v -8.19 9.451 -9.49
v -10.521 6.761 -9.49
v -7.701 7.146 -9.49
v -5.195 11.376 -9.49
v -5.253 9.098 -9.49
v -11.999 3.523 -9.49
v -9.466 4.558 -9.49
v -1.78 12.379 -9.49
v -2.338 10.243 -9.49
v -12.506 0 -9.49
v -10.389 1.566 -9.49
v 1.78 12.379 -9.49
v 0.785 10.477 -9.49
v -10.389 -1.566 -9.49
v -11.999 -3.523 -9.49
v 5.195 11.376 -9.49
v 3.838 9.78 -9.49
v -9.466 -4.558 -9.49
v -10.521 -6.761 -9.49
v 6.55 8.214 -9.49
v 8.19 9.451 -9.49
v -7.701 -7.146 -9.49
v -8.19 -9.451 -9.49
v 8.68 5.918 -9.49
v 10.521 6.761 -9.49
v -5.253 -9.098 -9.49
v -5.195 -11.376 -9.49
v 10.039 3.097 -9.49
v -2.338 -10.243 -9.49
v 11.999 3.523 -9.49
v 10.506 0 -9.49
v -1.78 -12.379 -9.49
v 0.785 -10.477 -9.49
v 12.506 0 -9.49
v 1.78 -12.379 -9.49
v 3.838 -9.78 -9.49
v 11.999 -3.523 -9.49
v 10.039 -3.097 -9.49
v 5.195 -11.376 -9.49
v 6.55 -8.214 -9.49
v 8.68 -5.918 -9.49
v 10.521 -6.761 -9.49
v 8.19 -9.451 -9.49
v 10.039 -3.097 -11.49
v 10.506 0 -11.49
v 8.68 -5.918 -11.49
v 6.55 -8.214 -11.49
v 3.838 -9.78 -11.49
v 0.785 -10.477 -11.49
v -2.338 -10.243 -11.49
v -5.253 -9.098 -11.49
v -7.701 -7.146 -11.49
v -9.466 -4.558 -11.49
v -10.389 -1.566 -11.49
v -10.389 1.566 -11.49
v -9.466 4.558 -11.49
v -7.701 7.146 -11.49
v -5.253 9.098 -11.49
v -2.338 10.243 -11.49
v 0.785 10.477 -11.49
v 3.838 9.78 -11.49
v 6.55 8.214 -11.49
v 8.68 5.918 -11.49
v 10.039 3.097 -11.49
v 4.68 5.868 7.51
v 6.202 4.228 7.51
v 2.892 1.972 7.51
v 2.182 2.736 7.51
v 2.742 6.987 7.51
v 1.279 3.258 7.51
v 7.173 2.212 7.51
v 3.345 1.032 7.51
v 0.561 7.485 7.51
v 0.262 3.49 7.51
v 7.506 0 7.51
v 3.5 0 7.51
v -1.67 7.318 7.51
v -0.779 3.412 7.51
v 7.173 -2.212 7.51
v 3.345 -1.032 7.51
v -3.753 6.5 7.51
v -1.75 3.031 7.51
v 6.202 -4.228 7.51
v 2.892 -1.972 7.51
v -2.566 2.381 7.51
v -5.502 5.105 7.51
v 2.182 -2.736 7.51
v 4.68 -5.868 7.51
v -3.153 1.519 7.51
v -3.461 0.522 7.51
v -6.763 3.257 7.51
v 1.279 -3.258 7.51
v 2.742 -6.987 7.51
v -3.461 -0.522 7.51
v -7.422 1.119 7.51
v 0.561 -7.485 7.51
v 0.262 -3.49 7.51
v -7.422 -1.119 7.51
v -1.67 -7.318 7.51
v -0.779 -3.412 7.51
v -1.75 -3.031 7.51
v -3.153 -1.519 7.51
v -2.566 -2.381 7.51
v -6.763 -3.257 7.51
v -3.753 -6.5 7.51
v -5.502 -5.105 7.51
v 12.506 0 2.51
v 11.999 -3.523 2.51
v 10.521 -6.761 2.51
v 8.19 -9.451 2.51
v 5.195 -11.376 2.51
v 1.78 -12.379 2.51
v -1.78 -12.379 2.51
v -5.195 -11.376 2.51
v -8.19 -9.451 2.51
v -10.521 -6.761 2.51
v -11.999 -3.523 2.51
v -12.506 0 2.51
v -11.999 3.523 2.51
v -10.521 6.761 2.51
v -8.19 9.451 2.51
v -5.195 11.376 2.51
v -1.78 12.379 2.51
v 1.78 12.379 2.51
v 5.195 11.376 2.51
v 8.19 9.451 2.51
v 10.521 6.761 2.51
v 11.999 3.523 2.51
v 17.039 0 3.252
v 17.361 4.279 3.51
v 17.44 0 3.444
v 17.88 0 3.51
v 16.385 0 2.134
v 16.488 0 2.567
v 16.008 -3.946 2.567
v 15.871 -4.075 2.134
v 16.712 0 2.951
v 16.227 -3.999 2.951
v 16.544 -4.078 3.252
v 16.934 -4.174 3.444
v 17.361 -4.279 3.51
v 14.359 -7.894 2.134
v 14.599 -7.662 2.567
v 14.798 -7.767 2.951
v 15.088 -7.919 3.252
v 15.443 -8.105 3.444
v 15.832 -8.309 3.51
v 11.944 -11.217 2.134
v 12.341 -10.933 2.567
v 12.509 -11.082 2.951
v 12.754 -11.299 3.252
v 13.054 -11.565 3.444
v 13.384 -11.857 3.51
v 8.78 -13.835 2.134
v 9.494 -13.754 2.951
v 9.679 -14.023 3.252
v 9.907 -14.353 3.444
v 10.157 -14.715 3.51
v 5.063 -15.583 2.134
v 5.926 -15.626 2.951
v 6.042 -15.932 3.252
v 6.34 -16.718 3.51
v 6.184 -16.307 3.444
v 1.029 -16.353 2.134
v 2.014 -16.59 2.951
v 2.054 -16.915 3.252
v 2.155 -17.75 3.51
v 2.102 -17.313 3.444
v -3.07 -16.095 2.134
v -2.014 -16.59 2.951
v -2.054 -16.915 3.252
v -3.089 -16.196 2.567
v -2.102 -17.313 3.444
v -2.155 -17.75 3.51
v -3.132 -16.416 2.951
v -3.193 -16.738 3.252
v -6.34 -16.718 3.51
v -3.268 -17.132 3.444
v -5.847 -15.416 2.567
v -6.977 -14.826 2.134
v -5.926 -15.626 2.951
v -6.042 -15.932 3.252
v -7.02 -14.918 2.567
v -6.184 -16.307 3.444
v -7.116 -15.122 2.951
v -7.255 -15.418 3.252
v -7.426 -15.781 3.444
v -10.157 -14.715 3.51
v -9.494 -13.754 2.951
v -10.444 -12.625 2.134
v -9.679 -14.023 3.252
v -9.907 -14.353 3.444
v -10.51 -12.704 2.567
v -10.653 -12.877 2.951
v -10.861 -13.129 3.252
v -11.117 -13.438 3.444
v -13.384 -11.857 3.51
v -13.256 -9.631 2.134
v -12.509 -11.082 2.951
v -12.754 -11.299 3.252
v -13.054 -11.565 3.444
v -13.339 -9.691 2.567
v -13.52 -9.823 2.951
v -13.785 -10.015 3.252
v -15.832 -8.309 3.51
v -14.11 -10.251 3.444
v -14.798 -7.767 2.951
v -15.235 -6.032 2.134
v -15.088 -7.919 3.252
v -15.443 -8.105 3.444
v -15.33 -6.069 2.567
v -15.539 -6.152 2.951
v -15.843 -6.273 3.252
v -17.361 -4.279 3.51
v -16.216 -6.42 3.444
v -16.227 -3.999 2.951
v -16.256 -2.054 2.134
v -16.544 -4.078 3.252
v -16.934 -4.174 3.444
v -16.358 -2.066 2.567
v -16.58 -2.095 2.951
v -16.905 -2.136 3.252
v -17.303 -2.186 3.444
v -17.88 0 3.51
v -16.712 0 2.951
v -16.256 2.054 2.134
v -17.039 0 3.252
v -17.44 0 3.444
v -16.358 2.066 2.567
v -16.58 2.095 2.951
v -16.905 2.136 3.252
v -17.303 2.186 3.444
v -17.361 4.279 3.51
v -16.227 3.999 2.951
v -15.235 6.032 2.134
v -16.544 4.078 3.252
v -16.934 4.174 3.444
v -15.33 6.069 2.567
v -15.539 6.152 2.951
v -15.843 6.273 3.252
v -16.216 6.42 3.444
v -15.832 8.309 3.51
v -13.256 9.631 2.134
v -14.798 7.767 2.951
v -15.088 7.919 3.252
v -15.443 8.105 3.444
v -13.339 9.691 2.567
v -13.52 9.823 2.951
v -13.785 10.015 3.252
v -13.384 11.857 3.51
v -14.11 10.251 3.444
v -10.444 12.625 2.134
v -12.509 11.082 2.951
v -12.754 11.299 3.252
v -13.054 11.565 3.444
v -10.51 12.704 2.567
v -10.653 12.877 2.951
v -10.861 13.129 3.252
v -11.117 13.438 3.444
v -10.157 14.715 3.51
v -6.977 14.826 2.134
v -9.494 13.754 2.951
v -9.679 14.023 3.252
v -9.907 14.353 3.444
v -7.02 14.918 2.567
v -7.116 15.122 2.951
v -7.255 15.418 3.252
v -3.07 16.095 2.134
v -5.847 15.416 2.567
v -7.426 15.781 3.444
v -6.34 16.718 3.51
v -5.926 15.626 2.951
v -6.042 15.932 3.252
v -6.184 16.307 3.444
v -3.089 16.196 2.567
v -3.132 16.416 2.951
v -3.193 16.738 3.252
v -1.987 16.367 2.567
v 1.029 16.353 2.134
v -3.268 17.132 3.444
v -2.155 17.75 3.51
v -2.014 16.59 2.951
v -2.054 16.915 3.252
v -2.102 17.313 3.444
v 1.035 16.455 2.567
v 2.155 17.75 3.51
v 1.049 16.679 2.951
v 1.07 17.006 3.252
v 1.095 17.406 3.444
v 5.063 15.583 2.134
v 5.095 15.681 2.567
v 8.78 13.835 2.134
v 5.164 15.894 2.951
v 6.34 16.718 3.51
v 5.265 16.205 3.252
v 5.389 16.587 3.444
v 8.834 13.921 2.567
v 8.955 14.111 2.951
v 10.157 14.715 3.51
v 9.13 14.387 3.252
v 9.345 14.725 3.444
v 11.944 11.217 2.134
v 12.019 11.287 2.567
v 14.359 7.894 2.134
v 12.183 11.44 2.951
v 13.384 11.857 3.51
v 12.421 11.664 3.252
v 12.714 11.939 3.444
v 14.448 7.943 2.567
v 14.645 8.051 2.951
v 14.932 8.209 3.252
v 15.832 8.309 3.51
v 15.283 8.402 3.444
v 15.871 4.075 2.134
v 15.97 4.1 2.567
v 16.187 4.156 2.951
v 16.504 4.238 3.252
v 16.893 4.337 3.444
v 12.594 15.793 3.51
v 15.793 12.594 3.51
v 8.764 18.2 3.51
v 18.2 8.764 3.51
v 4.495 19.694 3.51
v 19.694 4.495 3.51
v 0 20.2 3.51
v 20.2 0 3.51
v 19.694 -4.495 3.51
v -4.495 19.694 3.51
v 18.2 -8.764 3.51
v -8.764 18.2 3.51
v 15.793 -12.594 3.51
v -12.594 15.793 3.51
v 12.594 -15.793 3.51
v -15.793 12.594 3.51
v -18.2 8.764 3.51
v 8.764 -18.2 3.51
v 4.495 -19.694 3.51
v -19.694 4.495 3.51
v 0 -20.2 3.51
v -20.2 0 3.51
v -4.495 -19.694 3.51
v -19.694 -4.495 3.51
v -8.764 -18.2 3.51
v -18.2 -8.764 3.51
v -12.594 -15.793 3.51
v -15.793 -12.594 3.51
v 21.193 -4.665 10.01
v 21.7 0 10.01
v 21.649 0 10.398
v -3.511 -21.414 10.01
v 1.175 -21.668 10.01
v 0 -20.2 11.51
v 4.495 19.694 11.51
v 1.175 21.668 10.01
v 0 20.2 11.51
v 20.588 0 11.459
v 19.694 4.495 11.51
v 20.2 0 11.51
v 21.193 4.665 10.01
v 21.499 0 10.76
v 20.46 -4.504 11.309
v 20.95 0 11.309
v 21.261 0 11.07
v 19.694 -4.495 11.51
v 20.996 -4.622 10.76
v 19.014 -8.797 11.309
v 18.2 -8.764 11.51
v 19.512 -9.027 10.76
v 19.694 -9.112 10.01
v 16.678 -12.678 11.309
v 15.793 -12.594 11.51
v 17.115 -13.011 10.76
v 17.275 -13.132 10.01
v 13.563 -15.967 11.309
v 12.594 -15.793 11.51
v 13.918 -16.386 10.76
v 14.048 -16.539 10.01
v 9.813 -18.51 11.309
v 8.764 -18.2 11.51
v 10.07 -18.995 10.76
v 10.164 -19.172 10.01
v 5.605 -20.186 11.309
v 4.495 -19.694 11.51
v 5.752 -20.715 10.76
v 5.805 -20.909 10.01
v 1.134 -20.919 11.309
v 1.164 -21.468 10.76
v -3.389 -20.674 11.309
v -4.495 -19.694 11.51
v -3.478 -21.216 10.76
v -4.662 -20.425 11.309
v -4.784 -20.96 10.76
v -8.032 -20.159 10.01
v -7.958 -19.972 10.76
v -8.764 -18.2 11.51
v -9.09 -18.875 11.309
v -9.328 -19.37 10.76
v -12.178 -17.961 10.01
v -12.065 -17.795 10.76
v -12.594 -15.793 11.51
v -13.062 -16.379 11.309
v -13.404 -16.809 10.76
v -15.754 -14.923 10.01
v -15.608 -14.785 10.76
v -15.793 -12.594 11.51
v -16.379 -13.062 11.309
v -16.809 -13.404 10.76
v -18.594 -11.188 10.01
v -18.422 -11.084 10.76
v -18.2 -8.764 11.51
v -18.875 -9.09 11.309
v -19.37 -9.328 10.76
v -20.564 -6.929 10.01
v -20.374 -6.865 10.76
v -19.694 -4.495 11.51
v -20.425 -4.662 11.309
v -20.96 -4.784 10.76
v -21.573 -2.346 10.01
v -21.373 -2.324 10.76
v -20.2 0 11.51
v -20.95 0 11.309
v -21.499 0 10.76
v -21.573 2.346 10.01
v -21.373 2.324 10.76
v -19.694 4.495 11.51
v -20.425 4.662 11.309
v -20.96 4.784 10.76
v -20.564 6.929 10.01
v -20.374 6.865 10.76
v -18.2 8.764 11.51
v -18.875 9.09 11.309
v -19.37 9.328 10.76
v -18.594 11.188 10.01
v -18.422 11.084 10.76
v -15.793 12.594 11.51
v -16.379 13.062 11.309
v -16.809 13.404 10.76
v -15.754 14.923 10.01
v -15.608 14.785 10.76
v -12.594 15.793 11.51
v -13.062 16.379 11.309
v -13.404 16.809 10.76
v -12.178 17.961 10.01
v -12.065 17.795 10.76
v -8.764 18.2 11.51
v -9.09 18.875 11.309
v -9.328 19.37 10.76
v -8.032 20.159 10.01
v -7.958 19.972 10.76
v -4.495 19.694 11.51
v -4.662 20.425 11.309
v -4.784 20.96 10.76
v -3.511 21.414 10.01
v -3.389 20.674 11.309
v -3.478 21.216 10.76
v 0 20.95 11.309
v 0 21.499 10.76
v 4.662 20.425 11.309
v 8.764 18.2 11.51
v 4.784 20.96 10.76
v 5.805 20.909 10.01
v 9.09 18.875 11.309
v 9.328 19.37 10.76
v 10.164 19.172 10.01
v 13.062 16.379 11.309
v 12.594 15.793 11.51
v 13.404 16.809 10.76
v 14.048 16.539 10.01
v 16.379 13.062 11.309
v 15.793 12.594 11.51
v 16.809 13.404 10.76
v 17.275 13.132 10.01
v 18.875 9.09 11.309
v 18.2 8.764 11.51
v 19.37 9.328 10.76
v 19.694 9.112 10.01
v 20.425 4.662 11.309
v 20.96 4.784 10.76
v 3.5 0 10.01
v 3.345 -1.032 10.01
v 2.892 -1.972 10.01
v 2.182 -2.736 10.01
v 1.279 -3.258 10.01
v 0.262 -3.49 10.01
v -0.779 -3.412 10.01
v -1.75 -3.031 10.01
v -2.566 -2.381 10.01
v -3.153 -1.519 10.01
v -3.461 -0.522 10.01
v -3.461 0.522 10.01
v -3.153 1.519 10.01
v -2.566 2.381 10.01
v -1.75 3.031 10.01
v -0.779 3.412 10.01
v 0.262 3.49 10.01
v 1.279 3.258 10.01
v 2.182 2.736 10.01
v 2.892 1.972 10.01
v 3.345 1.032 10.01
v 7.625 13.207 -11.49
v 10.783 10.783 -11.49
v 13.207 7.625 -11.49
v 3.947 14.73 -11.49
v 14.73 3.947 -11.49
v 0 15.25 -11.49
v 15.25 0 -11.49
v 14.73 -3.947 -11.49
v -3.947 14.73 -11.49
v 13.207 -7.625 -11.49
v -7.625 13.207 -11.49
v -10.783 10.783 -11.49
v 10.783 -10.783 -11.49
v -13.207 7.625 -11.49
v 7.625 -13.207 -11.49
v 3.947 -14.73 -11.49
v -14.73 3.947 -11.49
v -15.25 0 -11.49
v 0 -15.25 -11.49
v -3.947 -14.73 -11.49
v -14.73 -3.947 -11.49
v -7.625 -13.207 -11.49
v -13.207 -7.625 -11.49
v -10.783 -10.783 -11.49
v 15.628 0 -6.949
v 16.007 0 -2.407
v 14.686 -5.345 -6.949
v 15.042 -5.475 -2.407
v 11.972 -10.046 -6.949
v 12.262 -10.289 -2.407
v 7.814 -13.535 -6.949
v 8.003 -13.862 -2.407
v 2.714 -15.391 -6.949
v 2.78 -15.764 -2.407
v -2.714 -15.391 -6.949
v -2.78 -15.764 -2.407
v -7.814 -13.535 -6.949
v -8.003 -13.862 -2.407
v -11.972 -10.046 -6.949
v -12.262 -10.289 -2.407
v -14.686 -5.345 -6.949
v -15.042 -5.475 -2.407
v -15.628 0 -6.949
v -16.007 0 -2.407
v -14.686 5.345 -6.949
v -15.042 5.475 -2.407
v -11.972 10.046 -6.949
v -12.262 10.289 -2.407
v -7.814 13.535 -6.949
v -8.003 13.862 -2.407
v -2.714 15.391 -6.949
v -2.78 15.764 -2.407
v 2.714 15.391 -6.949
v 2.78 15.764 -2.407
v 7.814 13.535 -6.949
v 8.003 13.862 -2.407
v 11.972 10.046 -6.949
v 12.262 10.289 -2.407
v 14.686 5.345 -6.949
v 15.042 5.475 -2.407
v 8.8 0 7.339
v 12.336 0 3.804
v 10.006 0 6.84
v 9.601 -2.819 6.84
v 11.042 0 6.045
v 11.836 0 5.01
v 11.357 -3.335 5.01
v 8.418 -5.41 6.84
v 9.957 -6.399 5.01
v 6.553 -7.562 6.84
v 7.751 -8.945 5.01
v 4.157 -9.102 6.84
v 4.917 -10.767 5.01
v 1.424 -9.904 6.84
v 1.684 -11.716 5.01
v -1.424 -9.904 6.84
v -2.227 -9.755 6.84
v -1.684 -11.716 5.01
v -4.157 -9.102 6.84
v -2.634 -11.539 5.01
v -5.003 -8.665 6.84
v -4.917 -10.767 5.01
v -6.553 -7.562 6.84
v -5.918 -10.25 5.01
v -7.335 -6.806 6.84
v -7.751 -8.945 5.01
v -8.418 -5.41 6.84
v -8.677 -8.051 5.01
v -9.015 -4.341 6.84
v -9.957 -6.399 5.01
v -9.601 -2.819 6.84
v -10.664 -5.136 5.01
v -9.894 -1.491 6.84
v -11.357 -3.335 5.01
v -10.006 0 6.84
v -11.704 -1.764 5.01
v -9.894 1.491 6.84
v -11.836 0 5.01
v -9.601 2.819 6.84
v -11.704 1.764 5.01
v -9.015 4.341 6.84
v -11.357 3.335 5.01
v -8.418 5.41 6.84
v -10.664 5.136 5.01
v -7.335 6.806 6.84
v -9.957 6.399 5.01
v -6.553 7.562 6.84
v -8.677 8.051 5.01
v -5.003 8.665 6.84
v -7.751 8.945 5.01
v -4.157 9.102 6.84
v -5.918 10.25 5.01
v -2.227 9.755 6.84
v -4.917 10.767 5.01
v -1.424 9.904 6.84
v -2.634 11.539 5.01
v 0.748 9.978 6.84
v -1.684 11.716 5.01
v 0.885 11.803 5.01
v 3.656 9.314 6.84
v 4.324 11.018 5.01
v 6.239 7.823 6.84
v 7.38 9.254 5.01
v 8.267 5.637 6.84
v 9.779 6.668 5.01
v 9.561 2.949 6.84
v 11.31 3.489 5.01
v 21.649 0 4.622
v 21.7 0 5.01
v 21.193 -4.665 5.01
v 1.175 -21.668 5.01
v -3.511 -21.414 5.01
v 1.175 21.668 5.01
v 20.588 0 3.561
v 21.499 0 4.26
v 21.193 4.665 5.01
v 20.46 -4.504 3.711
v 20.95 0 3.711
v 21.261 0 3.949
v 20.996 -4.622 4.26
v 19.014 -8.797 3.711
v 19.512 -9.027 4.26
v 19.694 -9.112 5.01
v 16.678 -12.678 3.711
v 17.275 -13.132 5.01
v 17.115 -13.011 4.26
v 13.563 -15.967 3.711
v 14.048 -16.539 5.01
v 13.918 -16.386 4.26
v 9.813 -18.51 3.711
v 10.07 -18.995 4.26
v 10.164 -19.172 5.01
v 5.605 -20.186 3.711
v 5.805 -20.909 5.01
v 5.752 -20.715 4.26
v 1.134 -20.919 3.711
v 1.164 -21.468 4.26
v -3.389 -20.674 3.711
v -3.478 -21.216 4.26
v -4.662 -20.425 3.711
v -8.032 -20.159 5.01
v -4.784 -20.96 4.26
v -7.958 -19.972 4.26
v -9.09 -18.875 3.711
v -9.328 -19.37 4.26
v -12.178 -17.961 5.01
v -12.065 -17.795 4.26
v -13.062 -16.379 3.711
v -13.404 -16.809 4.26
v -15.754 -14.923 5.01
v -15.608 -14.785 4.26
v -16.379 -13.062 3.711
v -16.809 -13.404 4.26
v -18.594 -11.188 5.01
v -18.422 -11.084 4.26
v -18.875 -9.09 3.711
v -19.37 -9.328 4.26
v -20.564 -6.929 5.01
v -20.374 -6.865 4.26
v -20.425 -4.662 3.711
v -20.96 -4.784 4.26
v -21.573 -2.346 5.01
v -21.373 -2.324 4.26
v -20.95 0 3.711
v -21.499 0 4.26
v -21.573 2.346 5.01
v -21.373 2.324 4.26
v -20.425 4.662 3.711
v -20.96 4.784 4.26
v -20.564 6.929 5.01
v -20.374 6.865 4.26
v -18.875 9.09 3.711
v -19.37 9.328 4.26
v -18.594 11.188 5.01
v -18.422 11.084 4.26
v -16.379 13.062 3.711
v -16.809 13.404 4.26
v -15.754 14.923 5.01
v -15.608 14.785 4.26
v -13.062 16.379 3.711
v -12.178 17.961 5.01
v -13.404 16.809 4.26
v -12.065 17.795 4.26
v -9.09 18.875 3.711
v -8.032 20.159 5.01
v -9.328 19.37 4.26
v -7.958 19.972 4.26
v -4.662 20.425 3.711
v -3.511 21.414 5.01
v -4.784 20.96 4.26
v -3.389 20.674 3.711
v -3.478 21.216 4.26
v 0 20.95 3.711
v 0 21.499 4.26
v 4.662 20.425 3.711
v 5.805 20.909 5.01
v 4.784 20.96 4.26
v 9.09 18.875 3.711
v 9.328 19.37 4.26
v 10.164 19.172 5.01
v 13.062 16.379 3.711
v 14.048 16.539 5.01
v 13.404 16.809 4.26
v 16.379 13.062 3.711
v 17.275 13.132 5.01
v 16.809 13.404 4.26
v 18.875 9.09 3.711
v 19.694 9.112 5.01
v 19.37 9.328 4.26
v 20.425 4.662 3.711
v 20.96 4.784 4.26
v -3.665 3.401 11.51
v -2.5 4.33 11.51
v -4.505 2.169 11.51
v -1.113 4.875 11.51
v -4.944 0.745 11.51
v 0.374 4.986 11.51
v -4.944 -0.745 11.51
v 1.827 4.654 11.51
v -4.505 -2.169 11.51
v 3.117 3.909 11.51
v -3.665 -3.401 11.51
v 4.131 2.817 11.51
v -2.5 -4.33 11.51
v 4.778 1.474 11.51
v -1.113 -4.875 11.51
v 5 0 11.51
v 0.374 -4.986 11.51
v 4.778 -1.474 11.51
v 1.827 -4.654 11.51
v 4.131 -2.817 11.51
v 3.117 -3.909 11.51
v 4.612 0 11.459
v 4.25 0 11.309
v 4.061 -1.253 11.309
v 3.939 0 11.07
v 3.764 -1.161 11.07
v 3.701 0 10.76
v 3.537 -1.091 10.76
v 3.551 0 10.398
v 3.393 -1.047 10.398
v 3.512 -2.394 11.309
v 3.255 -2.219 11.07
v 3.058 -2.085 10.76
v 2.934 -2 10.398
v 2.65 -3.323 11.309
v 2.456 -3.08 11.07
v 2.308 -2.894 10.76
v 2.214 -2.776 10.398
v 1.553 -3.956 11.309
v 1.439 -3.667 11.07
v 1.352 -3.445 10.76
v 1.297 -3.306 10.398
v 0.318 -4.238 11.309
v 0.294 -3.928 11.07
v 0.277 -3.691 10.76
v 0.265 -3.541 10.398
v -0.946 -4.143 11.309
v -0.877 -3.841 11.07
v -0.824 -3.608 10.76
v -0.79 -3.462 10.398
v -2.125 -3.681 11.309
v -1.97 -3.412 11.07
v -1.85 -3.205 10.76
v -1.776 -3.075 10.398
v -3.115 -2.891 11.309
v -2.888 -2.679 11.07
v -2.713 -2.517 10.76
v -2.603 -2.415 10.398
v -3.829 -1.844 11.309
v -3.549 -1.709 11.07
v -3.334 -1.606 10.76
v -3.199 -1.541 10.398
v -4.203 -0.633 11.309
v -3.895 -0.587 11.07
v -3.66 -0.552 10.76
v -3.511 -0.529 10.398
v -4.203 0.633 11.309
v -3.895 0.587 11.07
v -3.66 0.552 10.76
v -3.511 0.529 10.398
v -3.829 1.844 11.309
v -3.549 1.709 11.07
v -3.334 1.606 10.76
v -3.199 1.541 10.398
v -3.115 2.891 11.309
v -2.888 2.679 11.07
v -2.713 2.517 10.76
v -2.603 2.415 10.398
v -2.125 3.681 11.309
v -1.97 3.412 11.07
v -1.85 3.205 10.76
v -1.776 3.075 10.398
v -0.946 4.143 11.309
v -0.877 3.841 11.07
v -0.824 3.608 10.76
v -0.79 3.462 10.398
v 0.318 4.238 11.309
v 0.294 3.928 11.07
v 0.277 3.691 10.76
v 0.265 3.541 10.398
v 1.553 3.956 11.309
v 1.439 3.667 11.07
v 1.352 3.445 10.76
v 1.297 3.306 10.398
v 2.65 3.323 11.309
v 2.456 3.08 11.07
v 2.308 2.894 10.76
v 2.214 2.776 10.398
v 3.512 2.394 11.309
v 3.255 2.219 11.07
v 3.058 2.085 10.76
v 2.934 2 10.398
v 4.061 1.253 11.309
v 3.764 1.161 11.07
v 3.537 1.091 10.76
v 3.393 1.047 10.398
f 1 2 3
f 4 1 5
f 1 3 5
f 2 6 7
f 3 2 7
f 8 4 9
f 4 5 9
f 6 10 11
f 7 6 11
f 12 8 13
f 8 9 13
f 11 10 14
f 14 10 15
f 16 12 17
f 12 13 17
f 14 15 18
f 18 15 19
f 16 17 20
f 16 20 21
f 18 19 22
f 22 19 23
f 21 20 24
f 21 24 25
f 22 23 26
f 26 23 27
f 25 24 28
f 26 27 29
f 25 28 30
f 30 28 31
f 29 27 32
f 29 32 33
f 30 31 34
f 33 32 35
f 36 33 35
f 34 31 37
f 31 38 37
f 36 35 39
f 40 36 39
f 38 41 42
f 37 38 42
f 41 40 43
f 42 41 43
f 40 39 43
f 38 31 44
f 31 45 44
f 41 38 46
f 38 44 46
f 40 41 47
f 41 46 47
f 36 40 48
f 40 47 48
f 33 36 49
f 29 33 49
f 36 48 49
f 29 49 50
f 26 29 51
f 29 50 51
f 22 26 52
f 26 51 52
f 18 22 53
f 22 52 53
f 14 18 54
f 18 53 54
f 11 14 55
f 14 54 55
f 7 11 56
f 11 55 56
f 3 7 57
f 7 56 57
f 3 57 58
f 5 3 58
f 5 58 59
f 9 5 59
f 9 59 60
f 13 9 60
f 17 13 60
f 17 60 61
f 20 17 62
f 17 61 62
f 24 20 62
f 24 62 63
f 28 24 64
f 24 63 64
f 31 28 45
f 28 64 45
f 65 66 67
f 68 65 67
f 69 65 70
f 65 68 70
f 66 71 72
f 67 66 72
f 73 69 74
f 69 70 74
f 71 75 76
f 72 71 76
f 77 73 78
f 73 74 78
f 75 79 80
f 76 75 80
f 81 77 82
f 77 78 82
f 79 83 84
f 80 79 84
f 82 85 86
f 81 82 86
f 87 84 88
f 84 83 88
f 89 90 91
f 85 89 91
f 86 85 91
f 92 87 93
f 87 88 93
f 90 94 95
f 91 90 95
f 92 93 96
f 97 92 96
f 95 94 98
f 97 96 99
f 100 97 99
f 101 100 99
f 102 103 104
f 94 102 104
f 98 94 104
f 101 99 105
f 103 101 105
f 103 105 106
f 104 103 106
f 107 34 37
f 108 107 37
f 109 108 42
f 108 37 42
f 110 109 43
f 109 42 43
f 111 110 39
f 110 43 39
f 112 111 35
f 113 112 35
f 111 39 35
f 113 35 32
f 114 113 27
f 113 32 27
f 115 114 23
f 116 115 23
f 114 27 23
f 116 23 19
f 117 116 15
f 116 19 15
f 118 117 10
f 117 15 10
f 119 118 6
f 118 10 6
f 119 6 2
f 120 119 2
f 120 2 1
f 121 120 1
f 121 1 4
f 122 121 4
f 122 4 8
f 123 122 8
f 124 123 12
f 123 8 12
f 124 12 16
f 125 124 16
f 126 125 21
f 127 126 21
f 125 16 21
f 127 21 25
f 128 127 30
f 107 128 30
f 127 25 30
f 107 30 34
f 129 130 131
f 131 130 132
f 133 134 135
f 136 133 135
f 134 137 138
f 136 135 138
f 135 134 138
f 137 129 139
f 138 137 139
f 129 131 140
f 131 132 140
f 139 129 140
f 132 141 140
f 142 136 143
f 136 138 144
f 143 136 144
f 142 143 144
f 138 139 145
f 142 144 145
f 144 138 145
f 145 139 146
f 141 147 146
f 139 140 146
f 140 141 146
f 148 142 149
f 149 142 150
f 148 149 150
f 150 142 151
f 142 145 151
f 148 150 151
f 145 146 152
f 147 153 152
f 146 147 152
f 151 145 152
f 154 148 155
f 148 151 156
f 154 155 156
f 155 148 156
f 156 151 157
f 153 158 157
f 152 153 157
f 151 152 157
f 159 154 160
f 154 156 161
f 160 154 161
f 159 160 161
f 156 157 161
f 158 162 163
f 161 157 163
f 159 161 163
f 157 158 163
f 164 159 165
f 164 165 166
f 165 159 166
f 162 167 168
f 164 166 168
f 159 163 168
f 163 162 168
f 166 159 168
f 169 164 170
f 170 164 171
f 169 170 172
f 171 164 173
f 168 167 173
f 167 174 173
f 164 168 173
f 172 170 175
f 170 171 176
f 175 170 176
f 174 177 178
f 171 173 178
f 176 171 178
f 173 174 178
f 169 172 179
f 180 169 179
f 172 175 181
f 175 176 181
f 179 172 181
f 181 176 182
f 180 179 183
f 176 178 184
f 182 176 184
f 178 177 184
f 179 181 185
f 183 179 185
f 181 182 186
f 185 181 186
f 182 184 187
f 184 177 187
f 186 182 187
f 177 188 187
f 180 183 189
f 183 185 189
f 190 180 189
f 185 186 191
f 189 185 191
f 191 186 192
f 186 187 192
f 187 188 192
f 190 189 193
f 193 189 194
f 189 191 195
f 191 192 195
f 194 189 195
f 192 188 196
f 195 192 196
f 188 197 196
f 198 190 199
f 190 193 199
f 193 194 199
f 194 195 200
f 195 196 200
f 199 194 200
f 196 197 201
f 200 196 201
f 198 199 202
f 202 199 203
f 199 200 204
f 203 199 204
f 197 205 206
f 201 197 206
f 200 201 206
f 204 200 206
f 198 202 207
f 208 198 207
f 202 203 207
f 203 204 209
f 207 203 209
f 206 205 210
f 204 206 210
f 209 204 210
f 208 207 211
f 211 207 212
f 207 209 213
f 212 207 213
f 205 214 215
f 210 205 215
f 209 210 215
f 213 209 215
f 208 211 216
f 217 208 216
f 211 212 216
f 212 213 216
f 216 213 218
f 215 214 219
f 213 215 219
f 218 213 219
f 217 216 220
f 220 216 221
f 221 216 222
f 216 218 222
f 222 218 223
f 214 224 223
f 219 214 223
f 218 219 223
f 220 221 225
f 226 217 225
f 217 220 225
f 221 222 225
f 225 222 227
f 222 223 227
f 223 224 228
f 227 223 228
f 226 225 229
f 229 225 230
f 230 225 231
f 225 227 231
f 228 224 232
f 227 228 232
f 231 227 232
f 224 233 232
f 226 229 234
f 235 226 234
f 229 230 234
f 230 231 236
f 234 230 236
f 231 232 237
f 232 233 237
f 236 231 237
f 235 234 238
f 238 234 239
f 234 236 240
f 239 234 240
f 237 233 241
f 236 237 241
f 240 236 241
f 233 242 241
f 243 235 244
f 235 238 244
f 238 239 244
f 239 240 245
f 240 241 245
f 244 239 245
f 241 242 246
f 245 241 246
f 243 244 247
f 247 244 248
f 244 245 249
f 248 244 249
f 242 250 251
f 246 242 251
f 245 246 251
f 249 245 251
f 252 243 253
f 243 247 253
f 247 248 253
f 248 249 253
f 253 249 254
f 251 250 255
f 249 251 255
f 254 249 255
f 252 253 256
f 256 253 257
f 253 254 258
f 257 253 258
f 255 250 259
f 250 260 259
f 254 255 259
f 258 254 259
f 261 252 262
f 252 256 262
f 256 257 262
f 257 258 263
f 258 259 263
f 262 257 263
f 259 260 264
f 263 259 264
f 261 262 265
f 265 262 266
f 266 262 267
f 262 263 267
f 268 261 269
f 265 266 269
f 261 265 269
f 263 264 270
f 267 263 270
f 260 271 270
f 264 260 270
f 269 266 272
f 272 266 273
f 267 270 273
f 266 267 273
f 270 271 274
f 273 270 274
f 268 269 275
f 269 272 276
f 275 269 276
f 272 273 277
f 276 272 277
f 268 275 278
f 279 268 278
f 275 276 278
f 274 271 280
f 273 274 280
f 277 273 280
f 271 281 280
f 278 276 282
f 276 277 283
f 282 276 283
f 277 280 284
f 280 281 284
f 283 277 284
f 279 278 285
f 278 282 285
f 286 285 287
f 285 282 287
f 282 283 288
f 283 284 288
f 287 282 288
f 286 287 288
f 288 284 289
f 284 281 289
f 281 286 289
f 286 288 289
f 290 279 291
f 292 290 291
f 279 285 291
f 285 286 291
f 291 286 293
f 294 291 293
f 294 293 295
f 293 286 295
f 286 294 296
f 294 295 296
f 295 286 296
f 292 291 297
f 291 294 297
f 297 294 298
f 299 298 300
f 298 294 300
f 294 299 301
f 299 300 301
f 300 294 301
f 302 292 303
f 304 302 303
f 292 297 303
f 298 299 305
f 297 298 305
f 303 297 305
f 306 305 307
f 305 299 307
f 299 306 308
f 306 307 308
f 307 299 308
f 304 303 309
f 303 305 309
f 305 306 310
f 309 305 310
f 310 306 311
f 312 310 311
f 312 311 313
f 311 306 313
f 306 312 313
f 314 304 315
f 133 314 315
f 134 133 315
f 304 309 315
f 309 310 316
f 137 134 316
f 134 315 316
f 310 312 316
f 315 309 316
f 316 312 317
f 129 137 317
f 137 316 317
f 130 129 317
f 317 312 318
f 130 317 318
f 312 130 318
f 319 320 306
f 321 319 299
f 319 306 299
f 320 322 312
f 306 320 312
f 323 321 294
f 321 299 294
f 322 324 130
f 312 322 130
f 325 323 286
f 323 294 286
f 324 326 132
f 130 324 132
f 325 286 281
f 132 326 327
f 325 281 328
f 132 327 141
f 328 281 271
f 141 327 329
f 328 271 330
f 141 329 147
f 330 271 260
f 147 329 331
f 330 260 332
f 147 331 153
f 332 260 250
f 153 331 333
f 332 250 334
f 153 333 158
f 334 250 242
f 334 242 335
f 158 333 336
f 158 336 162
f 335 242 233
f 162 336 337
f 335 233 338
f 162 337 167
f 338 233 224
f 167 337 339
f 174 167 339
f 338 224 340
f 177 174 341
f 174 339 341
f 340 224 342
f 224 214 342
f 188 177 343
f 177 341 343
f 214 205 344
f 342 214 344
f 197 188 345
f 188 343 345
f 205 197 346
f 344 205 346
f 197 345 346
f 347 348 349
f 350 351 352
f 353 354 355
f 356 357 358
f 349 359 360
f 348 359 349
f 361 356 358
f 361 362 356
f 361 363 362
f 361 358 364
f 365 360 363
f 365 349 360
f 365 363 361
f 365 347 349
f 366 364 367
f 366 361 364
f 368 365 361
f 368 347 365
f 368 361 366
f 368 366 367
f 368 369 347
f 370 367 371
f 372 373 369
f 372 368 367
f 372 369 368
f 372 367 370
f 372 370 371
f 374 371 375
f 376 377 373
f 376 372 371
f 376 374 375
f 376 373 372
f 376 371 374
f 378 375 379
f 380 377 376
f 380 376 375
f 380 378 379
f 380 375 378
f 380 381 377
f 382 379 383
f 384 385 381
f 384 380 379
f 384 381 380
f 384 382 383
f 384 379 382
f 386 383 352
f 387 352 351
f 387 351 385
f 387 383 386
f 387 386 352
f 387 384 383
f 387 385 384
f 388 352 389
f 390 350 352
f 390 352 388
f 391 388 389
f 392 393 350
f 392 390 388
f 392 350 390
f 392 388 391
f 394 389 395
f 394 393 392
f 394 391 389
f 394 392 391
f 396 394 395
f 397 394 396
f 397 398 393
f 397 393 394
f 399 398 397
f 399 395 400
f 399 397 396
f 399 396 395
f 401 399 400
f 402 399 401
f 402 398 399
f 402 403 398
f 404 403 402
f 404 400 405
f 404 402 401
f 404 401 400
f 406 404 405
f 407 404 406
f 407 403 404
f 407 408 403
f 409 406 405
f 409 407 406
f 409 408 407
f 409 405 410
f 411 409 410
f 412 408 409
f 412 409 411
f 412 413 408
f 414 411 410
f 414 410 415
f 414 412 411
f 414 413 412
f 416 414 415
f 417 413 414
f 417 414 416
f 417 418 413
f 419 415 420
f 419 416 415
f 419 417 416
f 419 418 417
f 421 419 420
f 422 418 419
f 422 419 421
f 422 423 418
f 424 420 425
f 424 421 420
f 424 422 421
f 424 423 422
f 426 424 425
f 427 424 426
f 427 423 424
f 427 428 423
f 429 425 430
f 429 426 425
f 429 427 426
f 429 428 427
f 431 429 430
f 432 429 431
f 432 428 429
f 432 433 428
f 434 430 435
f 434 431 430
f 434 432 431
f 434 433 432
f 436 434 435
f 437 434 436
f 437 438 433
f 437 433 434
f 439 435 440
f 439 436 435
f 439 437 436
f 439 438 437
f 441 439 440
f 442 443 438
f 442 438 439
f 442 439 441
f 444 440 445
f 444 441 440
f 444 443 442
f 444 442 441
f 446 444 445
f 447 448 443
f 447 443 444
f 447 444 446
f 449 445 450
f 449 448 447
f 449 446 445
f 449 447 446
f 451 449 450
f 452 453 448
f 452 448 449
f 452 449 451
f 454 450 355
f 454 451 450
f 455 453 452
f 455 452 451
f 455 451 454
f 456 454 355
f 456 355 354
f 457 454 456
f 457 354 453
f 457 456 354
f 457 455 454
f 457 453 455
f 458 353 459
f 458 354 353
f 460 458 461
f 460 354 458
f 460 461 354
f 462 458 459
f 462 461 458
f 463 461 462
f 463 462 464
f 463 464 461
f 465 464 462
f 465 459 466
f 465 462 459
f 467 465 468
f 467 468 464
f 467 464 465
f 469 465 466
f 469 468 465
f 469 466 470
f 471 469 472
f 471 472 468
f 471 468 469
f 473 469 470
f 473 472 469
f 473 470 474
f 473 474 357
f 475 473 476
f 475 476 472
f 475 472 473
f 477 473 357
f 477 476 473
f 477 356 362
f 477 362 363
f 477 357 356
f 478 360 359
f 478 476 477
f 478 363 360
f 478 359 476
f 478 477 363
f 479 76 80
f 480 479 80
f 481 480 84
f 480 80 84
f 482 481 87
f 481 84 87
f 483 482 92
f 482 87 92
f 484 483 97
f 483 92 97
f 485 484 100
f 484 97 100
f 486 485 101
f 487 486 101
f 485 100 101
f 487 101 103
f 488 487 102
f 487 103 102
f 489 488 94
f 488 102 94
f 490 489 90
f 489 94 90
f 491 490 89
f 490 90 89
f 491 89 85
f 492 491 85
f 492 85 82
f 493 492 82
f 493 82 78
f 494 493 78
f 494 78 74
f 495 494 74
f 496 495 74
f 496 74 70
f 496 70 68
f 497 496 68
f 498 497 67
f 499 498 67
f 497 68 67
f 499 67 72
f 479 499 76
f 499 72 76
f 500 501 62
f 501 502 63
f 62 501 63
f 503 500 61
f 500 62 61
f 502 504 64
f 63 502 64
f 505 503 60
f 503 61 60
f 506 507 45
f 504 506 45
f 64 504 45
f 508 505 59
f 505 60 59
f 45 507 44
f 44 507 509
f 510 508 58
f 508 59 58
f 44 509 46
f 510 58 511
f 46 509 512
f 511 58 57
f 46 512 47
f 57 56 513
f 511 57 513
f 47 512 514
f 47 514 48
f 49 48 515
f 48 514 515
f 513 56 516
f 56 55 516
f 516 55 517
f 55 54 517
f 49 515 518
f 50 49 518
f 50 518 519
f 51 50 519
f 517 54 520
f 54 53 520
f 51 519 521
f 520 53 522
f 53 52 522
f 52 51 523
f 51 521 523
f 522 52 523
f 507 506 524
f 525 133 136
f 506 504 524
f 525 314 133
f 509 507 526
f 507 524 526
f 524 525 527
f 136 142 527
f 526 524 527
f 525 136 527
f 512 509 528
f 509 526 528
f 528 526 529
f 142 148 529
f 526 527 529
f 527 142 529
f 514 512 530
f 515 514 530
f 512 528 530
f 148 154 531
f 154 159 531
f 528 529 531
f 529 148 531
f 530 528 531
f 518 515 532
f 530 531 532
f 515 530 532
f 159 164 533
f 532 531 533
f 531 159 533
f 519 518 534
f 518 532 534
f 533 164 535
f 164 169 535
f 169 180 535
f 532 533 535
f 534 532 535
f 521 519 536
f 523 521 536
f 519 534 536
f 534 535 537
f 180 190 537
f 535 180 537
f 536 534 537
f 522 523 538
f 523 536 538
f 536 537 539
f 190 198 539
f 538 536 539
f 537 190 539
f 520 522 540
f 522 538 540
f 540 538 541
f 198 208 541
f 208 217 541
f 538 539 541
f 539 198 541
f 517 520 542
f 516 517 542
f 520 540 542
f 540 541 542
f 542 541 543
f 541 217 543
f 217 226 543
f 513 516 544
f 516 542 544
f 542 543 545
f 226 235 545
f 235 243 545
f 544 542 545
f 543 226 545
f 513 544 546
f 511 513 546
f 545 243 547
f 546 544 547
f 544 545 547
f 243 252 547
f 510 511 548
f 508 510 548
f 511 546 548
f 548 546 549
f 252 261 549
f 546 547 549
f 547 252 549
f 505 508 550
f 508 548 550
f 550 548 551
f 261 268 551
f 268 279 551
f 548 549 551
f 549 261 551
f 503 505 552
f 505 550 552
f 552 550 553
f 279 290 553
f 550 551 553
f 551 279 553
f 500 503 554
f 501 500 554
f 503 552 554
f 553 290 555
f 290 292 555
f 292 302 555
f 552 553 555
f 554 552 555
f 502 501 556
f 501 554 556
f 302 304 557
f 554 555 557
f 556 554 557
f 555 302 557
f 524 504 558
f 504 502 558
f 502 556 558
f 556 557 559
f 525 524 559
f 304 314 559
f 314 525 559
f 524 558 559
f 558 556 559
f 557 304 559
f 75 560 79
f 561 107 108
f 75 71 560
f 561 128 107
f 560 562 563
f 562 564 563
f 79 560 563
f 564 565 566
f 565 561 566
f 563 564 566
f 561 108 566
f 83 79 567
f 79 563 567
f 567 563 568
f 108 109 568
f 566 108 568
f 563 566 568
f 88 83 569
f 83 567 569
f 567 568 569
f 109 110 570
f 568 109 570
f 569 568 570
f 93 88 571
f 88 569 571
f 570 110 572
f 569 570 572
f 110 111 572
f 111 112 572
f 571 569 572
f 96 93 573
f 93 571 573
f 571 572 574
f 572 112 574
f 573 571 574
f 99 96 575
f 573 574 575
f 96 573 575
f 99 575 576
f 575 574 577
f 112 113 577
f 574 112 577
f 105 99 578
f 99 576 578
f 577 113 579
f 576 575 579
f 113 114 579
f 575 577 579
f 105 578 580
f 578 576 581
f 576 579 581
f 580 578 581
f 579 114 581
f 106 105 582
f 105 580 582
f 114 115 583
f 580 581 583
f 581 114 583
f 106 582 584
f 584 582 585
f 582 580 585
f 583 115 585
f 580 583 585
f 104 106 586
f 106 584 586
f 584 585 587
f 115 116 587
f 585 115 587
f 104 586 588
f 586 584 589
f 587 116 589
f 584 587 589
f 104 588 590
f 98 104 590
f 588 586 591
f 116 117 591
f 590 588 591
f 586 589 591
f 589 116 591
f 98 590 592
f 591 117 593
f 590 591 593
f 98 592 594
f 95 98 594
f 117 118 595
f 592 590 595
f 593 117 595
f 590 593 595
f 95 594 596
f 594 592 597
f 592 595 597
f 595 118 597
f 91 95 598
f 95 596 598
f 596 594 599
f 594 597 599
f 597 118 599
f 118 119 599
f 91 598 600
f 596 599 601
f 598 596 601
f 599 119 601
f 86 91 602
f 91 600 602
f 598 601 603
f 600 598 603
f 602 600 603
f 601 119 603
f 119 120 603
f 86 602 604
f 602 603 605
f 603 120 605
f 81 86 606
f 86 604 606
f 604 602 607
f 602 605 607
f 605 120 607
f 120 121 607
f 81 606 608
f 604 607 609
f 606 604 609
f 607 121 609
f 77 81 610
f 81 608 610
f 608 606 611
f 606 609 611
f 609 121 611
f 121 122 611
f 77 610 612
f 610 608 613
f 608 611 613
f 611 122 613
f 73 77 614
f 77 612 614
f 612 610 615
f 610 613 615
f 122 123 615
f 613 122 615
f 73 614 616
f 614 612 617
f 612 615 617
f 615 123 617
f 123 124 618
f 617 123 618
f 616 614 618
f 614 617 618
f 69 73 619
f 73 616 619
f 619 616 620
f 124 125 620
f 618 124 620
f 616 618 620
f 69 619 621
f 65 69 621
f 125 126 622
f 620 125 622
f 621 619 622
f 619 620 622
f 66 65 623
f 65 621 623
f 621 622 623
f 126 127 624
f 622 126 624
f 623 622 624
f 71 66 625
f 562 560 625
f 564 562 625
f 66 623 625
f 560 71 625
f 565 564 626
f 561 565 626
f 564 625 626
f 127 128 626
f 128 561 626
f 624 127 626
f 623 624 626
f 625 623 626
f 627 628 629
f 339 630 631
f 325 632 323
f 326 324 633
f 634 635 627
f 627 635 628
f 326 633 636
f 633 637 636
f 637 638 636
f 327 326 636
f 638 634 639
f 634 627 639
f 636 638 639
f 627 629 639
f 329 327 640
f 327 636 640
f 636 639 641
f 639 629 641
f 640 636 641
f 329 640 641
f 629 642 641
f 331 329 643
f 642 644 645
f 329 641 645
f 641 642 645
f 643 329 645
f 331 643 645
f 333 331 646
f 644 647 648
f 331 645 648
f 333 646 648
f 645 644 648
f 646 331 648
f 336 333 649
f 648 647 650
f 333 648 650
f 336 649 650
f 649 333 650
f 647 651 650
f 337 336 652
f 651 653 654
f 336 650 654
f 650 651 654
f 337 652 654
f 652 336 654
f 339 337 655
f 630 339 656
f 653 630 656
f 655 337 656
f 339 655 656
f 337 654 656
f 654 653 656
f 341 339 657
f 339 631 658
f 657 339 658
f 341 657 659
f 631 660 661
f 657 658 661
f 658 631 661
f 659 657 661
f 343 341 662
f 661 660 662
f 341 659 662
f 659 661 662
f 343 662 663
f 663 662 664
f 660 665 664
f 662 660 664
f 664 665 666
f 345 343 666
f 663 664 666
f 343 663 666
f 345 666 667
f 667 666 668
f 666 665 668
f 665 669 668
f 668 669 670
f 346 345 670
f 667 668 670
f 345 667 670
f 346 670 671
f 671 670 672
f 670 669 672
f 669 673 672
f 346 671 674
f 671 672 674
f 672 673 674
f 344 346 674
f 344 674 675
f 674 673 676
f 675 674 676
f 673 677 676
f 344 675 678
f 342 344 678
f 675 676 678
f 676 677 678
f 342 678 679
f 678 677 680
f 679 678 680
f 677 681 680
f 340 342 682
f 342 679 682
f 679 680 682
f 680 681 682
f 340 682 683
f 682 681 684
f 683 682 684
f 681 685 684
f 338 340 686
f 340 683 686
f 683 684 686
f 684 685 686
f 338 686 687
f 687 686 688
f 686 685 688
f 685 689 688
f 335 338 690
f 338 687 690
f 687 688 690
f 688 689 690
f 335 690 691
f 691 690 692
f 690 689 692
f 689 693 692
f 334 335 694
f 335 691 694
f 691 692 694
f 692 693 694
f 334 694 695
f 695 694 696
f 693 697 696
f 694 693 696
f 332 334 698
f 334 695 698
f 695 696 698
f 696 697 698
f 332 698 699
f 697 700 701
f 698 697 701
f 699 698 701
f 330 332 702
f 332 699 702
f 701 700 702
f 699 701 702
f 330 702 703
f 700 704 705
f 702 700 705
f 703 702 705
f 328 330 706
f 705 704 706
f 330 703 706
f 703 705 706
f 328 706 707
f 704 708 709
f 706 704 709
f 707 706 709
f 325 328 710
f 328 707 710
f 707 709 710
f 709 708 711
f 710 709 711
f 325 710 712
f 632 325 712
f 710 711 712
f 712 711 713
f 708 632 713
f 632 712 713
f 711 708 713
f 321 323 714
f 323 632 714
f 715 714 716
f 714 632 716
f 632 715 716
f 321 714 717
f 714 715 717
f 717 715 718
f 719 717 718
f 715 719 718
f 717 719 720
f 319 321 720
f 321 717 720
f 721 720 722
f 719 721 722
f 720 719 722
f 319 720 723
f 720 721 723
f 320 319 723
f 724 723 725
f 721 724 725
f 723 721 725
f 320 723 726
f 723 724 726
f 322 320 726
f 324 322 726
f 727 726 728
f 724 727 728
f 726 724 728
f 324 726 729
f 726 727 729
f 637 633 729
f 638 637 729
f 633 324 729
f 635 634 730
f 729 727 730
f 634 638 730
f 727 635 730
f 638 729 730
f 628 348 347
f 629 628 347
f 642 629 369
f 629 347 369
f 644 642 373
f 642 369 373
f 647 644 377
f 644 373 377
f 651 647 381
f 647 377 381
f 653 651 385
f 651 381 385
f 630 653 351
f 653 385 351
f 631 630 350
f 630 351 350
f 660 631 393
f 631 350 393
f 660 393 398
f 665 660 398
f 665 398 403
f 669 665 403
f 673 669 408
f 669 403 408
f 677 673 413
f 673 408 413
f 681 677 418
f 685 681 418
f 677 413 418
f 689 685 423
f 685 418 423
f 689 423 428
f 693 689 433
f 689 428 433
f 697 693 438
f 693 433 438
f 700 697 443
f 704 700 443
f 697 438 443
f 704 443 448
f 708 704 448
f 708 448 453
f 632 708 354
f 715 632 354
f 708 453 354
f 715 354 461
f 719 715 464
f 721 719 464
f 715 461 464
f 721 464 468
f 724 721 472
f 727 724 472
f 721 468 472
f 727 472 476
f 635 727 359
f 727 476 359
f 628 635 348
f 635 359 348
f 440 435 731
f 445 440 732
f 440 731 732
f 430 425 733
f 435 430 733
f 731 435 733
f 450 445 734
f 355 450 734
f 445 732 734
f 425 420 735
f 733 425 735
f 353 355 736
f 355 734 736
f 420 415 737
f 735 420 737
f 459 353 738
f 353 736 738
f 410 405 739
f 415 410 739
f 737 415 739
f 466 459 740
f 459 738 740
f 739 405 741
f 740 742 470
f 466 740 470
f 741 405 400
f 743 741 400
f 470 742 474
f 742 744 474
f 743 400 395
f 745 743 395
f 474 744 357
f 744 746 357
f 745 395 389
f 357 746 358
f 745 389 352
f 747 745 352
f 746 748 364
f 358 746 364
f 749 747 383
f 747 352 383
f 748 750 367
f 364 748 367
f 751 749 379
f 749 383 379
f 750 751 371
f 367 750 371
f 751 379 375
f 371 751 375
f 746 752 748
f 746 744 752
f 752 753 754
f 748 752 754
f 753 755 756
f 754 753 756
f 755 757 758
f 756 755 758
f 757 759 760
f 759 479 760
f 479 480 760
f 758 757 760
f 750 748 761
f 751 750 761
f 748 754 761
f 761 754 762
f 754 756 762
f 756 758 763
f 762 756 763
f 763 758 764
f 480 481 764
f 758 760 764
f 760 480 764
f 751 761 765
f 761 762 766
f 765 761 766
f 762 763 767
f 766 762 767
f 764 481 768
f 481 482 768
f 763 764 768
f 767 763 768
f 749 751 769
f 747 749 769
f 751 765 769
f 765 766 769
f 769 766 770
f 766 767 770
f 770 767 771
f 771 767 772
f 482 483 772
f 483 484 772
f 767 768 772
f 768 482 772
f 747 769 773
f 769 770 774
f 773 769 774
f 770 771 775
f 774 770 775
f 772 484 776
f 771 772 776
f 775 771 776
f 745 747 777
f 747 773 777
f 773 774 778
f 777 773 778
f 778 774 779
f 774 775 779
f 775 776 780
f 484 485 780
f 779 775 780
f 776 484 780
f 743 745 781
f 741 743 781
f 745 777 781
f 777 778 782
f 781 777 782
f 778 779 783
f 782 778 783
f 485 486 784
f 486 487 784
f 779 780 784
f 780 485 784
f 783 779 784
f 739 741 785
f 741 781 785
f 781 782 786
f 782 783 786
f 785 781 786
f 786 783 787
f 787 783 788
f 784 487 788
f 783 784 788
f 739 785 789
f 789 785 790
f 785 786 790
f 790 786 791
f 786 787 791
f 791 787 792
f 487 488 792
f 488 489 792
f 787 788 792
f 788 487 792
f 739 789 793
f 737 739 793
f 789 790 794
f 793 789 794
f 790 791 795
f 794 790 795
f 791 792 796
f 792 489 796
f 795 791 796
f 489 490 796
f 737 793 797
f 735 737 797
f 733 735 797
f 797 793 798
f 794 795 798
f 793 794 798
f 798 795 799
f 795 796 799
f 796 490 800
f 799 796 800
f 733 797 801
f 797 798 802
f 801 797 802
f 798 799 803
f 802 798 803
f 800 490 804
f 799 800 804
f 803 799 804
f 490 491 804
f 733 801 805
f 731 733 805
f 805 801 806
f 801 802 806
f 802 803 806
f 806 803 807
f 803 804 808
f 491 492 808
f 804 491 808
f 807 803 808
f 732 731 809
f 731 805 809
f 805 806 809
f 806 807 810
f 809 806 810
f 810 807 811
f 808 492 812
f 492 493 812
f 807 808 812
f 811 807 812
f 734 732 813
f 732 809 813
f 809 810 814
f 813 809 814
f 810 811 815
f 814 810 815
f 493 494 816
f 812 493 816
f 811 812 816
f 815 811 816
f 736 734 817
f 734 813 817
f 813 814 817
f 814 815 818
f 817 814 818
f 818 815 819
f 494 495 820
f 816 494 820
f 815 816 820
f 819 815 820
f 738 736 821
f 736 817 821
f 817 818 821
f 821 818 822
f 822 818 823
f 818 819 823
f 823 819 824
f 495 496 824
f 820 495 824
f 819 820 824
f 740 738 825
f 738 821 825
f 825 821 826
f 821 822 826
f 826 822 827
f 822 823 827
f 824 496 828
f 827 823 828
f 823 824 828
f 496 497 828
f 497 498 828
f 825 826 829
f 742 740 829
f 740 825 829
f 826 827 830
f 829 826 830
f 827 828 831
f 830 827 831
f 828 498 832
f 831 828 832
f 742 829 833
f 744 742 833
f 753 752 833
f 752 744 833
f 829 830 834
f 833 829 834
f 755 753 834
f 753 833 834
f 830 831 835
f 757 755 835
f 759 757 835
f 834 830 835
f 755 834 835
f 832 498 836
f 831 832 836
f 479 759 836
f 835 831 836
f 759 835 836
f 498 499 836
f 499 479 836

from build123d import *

# Parameters (mm, degrees)
F2_R = 1.5
F3_R = 5


with BuildPart() as f1:
    # F0 (on Front) → F1 (revolve)
    with BuildSketch(Plane.XZ):
        Polygon((21.7, 11.509762), (3.5, 11.509762), (3.5, 7.509762), (12.506023, 7.509762), (12.506023, -9.490238), (10.506023, -9.490238), (10.506023, -11.490238), (15.25, -11.490238), (16.5, 3.509762), (21.7, 3.509762), align=None)
    revolve(axis=Axis((0, 0, -6.313648), (0, 0, -1)))

    # F2
    f2_edges = [f1.edges().sort_by_distance(p)[0] for p in [
        (-3.5, 0, 11.509762),
        (-21.7, 0, 11.509762),
        (-21.7, 0, 3.509762),
        (-16.5, 0, 3.509762),
    ]]
    fillet(f2_edges, radius=F2_R)

    # F3
    f3_edges = [f1.edges().sort_by_distance(p)[0] for p in [
        (-12.506023, 0, 7.509762),
    ]]
    fillet(f3_edges, radius=F3_R)


solid = f1.part
